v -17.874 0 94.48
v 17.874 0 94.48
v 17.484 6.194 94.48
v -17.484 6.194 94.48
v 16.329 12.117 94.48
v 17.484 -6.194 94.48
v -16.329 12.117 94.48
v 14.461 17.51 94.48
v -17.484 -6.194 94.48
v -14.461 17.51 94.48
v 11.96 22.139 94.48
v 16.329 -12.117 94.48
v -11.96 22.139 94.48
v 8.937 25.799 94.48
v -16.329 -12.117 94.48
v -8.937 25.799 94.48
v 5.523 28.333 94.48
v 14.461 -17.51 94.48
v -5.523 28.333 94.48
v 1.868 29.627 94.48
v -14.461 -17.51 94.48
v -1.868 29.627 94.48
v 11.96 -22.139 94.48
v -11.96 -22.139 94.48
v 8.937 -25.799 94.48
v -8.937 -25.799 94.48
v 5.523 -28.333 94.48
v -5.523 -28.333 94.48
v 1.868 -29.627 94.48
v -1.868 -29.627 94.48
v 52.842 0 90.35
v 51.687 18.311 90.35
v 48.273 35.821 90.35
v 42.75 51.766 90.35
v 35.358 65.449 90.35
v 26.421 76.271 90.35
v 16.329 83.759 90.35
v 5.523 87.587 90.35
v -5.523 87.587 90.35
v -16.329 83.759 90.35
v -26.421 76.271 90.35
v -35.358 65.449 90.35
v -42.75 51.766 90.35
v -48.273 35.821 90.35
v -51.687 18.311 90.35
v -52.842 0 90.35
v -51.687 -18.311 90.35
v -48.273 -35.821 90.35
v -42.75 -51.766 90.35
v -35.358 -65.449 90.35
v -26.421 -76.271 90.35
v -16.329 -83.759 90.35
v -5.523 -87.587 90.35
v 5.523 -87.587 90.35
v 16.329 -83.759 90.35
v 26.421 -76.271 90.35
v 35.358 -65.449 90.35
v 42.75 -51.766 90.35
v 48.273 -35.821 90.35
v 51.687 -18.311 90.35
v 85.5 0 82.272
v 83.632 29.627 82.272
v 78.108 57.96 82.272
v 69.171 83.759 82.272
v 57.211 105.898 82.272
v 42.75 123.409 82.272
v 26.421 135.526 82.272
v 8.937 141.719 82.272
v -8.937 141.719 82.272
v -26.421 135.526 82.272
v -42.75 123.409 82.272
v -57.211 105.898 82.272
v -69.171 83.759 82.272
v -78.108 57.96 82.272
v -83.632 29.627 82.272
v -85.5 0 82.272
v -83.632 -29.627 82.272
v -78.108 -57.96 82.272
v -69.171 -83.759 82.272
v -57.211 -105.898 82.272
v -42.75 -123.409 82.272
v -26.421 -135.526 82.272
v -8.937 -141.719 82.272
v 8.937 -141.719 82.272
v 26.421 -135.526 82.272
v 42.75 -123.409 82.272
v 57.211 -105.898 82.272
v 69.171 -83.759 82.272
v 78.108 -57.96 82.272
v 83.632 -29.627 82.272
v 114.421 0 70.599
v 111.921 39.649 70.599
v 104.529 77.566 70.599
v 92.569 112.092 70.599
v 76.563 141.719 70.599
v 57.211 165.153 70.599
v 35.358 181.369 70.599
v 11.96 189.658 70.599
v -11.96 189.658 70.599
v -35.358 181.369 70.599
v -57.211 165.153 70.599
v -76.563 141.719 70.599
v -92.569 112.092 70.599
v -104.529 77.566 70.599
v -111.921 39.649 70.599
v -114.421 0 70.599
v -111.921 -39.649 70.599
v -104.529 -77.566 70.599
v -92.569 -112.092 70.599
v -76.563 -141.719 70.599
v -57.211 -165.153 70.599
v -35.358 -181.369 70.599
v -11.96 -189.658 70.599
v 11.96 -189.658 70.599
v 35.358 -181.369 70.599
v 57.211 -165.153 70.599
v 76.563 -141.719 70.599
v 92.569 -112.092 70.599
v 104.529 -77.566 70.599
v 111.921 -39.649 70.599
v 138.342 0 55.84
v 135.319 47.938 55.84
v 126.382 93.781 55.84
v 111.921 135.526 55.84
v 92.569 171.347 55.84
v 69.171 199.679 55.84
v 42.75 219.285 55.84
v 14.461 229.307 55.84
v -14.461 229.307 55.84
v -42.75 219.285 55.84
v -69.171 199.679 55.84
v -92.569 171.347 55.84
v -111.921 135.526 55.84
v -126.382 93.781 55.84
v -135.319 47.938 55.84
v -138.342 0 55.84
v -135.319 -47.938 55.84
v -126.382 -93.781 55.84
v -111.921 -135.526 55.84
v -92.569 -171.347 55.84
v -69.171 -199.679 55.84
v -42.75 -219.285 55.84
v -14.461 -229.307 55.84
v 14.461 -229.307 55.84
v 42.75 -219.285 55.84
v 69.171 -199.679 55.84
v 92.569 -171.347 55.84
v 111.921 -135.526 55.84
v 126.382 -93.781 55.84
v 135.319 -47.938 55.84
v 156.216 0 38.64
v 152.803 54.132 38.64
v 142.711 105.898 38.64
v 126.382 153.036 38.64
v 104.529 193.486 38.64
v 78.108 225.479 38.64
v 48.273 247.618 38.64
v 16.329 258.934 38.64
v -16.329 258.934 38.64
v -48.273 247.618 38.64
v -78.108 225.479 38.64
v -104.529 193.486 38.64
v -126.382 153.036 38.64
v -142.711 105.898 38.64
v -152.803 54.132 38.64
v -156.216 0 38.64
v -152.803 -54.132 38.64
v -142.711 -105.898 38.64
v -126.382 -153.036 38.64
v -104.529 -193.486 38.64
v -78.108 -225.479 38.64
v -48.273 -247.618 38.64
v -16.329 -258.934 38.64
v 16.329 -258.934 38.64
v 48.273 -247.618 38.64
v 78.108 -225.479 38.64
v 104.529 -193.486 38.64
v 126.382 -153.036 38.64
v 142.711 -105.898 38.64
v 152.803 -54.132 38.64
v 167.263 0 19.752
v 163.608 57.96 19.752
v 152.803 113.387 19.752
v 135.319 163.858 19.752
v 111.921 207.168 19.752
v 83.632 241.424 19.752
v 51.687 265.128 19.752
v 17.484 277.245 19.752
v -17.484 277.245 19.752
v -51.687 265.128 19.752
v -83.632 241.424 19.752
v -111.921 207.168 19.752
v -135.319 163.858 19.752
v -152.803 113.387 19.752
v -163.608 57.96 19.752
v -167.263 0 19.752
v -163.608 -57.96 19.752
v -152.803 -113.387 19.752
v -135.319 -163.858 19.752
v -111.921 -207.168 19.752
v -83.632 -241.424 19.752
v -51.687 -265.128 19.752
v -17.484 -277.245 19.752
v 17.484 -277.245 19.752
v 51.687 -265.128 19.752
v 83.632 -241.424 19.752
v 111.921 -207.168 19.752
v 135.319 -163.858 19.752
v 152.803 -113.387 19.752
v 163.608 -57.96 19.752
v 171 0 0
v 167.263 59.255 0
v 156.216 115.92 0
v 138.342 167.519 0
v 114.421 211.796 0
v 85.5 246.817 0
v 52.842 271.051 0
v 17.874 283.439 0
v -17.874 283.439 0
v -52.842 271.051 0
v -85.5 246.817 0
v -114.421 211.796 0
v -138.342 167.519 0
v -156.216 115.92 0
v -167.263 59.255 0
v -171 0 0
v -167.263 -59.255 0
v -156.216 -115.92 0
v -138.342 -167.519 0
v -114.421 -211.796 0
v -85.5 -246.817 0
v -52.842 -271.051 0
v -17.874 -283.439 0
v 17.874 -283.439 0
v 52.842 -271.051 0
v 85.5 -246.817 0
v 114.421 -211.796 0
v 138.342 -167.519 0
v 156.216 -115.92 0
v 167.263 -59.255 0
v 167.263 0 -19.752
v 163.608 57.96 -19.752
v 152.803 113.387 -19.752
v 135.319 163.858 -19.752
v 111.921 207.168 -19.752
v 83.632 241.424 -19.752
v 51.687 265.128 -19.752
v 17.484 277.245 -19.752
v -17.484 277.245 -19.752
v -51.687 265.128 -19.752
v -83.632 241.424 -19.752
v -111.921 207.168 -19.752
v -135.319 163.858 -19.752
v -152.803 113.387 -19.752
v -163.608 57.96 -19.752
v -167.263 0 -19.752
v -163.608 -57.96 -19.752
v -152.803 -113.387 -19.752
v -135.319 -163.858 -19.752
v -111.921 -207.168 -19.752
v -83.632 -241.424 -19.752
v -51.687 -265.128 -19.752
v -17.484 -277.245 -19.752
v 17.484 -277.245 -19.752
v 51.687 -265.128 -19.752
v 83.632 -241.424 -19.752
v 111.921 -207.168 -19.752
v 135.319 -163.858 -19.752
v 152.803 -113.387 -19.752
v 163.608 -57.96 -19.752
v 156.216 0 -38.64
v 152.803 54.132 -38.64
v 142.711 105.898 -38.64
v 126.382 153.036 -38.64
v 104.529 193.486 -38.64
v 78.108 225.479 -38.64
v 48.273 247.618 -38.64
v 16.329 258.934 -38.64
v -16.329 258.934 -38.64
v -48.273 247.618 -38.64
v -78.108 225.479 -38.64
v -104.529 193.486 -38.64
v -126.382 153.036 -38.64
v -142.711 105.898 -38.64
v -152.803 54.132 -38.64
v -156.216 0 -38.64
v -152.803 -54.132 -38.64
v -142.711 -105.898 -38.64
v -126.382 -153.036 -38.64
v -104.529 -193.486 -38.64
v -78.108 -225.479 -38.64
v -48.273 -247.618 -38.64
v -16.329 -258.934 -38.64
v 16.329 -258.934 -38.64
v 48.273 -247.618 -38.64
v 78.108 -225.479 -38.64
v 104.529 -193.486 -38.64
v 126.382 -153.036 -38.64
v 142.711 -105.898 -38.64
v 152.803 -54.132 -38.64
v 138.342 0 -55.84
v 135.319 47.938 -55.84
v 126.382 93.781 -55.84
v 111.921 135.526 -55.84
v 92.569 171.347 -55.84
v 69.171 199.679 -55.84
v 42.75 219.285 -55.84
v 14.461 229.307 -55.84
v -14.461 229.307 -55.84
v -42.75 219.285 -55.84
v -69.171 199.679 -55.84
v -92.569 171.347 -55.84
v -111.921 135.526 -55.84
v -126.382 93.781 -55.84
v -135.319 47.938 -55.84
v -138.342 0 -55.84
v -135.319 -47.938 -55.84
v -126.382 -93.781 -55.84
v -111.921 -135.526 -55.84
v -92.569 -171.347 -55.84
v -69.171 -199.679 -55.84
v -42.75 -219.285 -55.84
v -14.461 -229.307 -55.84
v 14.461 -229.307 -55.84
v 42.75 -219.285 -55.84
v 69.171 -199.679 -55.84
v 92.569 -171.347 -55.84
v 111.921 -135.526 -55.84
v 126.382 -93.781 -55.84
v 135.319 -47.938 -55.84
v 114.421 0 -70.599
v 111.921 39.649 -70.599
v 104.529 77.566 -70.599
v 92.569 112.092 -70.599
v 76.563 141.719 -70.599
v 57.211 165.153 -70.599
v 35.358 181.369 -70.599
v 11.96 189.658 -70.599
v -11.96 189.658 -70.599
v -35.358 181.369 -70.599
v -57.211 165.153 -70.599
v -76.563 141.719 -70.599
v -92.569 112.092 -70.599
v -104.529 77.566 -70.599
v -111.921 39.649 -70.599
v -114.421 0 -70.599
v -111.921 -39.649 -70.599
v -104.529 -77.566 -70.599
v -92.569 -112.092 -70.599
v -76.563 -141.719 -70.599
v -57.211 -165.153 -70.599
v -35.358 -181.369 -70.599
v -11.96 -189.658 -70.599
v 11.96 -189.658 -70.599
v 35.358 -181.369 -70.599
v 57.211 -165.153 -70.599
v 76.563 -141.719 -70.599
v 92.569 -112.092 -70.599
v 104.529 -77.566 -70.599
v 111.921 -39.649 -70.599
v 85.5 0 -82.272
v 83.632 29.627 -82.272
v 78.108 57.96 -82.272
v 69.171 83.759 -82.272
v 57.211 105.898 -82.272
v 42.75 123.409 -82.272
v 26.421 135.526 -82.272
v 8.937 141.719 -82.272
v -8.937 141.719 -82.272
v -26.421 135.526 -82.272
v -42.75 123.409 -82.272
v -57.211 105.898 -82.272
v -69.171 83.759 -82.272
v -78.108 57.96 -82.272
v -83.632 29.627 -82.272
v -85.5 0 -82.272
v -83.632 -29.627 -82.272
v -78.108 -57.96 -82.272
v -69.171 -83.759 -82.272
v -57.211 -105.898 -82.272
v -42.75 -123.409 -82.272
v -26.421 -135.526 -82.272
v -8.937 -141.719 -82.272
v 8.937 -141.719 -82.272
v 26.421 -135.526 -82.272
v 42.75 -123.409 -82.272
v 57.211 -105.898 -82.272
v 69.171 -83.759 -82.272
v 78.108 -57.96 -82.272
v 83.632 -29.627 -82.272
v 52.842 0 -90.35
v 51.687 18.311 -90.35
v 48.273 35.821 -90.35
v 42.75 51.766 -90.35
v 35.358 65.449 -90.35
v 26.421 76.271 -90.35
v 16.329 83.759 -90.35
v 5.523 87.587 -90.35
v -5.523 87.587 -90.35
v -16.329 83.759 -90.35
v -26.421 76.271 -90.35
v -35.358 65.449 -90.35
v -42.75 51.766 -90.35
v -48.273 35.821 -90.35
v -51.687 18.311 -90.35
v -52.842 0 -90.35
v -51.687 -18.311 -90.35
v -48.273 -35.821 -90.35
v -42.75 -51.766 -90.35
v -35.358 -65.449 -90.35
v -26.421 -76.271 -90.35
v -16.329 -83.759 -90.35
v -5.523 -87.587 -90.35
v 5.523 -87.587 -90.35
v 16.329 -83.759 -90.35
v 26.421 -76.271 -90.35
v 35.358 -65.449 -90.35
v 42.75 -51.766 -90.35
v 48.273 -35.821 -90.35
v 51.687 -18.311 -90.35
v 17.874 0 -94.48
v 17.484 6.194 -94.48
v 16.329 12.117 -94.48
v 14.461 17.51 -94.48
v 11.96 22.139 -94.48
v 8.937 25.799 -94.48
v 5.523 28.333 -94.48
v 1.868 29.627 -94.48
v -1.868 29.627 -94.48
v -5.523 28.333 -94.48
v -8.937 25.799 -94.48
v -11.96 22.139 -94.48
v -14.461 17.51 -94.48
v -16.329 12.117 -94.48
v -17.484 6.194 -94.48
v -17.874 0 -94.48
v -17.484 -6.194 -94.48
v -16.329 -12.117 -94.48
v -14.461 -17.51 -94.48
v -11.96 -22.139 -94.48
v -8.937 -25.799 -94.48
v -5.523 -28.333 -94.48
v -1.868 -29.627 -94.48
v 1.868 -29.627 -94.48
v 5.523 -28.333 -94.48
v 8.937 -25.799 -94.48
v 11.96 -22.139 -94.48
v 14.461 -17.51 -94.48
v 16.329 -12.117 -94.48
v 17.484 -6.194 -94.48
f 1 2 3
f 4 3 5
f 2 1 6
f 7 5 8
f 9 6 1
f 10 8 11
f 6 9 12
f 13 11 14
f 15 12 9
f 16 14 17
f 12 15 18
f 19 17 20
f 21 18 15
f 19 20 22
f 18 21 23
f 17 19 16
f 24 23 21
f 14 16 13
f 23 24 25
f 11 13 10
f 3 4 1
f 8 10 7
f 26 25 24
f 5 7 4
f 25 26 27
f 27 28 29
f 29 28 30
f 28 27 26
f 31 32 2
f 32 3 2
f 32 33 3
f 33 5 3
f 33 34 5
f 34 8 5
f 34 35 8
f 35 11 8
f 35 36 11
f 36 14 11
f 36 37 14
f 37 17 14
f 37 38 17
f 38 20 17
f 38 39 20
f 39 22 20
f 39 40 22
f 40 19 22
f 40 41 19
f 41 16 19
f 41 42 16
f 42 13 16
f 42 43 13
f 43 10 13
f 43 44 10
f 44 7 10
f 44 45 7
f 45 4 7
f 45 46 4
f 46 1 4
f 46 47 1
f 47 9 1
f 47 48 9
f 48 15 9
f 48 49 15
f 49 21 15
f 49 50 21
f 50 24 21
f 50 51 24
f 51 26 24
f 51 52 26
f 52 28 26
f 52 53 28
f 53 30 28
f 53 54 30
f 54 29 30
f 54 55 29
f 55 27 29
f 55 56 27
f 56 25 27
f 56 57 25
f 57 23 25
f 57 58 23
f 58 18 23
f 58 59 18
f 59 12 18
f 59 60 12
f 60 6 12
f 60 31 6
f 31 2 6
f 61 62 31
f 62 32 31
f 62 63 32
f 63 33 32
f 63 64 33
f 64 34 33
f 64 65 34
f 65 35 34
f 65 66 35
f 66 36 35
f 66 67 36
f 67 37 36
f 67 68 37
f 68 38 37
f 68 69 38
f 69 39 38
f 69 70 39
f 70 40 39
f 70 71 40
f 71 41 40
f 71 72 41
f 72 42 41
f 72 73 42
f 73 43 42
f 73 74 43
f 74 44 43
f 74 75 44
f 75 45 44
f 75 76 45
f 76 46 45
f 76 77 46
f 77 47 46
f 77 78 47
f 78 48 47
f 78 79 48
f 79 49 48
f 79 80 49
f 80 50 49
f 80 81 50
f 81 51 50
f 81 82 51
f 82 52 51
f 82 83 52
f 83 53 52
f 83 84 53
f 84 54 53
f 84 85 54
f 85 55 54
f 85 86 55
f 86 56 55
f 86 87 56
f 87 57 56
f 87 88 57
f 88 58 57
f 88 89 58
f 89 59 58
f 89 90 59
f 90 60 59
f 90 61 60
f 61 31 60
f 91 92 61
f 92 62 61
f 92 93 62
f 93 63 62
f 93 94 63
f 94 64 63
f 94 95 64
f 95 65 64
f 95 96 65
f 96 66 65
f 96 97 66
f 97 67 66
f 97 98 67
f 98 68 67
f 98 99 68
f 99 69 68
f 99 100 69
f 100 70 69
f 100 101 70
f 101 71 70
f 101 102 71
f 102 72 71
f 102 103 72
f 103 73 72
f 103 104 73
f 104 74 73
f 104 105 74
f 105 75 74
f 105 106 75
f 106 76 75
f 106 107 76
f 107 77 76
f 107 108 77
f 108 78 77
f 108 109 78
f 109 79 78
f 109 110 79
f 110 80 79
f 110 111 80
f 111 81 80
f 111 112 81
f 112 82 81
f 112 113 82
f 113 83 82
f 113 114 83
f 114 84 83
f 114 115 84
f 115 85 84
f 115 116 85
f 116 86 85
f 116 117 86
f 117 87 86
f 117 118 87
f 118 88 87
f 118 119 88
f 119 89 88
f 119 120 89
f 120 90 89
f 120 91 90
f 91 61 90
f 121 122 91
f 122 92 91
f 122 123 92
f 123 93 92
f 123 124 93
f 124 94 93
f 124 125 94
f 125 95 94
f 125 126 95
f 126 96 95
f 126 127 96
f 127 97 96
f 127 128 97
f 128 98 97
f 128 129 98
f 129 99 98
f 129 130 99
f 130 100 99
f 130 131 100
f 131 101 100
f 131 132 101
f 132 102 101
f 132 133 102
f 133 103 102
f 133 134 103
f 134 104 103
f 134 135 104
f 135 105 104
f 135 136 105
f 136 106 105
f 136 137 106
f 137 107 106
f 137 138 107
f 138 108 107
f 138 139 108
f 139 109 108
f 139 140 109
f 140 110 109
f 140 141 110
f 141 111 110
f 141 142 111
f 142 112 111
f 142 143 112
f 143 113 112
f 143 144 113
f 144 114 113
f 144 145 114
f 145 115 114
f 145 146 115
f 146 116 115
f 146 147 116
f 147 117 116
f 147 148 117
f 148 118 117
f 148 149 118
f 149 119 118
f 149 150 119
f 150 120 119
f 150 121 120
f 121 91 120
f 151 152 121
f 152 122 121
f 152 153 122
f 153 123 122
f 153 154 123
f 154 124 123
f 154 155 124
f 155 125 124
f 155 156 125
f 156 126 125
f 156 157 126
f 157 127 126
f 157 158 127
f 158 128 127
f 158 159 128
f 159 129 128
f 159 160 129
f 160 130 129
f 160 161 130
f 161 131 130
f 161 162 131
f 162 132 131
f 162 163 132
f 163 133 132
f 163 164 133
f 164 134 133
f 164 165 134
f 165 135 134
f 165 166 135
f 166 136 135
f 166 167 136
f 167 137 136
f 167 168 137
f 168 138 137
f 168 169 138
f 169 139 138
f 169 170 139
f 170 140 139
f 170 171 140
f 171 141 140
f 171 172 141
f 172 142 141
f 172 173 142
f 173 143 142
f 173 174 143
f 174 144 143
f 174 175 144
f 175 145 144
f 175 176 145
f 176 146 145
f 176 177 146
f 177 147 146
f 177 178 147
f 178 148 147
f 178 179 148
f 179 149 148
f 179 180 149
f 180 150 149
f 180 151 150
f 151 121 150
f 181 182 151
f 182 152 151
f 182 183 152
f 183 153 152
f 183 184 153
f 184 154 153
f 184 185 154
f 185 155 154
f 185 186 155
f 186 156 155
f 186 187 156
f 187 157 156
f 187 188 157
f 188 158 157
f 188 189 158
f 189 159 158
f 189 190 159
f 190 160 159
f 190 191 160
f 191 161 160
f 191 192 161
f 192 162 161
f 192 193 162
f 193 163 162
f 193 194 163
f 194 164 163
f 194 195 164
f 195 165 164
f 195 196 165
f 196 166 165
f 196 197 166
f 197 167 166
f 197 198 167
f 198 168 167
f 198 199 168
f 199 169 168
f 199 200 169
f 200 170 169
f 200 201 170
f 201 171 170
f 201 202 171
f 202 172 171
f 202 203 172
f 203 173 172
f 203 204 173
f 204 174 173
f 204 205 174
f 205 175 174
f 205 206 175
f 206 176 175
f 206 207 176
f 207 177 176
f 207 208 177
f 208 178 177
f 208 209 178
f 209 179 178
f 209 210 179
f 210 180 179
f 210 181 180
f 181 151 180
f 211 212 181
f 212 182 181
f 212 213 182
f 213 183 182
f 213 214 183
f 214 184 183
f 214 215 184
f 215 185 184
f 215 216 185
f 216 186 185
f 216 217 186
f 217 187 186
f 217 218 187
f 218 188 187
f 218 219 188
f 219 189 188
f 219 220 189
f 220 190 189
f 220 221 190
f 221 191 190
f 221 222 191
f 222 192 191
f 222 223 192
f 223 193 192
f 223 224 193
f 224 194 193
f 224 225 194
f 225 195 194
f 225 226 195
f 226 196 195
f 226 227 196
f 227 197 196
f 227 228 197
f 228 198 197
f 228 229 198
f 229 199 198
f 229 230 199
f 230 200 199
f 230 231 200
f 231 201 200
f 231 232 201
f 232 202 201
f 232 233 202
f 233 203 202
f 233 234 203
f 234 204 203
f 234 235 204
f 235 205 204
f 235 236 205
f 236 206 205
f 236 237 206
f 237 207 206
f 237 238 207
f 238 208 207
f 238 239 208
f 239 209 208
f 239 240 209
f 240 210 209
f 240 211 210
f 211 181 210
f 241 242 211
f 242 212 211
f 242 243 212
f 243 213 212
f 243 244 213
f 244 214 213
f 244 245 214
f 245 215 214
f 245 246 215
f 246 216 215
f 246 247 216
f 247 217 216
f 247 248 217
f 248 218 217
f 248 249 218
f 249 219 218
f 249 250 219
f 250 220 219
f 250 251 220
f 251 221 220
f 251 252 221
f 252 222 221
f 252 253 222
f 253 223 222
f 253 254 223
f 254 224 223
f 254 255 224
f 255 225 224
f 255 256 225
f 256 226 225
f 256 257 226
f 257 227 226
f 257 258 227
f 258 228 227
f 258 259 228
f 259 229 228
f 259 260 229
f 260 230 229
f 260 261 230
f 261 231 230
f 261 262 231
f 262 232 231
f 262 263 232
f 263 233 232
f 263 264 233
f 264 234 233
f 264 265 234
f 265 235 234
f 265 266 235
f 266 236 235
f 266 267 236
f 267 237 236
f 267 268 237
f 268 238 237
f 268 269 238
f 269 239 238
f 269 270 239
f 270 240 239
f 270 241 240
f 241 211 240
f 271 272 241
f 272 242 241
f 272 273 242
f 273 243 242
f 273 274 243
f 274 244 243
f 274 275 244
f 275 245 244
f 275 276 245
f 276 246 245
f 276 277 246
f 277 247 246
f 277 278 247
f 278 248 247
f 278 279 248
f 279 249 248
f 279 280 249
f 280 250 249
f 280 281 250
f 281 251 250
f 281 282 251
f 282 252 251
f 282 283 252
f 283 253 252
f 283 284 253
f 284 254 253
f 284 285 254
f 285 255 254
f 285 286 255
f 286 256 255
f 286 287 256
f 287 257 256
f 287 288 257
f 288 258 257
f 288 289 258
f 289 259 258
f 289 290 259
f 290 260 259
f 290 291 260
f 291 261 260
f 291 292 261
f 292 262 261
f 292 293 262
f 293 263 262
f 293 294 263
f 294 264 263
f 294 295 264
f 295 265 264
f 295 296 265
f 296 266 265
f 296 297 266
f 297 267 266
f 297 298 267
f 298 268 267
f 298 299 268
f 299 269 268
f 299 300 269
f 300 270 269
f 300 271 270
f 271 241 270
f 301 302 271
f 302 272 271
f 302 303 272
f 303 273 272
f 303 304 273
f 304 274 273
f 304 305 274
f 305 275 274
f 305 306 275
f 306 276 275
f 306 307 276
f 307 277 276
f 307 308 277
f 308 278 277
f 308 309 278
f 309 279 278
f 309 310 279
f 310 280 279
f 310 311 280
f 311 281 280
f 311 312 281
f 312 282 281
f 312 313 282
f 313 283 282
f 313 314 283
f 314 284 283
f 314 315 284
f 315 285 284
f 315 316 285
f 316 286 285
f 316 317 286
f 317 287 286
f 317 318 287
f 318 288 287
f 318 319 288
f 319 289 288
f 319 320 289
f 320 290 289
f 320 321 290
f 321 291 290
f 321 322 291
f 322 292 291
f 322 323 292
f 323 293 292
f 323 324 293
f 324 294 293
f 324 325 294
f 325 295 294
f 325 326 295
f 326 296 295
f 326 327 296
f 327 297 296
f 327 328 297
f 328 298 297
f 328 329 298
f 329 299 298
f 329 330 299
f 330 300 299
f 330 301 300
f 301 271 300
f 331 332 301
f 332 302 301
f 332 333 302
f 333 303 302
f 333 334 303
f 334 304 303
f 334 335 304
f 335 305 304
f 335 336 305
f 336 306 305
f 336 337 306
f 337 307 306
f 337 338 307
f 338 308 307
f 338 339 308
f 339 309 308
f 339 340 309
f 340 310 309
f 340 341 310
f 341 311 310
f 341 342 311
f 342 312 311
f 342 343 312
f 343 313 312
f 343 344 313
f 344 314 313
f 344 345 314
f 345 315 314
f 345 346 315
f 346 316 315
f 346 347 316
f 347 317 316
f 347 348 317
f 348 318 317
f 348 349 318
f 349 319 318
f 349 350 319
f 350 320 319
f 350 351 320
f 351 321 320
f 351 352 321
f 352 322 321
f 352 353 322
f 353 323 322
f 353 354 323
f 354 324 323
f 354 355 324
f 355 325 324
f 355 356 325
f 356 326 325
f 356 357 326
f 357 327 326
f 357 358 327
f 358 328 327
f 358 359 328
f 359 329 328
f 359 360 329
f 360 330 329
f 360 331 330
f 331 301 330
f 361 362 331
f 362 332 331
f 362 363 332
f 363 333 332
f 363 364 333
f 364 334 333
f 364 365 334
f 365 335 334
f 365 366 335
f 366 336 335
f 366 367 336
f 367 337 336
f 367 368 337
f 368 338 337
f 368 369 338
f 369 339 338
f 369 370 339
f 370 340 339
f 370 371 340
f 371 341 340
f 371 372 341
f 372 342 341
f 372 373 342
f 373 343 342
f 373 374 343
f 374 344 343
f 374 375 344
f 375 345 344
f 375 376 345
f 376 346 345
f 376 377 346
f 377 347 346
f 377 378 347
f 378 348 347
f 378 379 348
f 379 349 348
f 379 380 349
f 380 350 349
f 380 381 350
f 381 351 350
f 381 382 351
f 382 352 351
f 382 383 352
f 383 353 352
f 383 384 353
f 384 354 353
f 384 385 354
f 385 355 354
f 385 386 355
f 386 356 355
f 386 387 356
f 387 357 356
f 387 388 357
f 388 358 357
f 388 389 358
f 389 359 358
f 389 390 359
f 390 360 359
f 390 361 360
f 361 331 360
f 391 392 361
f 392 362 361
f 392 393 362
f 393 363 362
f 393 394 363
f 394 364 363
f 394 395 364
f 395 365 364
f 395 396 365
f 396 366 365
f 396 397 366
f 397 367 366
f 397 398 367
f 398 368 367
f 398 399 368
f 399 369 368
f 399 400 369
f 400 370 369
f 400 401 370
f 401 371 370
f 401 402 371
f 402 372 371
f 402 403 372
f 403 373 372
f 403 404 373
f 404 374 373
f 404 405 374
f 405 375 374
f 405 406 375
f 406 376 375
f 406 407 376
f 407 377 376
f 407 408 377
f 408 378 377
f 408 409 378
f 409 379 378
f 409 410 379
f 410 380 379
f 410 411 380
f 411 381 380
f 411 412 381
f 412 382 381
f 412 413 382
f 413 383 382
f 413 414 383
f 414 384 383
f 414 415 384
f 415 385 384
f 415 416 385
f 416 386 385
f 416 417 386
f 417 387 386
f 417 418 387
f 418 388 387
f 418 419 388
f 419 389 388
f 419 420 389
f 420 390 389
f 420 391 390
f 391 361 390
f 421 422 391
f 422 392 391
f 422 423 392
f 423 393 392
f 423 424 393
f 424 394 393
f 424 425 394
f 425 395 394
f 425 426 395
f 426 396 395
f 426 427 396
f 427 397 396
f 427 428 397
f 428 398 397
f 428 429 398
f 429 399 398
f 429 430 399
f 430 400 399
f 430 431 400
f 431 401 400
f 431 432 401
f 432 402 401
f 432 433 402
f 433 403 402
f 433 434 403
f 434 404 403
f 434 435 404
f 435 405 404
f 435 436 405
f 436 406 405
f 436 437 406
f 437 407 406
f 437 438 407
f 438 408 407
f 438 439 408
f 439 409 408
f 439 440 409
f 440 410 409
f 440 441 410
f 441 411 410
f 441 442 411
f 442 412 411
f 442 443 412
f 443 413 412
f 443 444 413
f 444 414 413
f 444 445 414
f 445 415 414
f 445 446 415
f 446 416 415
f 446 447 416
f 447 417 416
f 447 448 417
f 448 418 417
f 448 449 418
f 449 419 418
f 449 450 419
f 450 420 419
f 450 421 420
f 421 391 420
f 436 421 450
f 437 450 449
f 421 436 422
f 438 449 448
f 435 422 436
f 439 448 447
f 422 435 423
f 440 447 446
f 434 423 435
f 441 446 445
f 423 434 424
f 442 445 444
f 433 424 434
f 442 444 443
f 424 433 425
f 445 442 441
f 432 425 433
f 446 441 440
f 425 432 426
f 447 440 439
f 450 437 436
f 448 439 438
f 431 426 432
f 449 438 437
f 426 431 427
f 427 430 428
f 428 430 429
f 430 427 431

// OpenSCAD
// Generated by SolidPython 1.0.1 on 2020-07-29 00:46:49


scale(v = [9, 15, 5]) {
	sphere(r = 19);
}
/***********************************************
*********      SolidPython code:      **********
************************************************
 
# import packages: SolidPython
from solid import *
from solid.utils import *
from itertools import chain, combinations, permutations


class Resize:

    def __init__(self, scad_file):
        self.scad_file = scad_file
        #self.scad_file = import_scad(scad_file)
        # cone/cylinder param:
        self.r1 = 0
        self.r2 = 0
        self.h = 0
        # rectangular prism param:
        self.w = 0
        self.l = 0
        # ellipse param:
        self.r = 0

    # import OpenScad code (file name corresponds to shape)


    # classify shape + parameters
    def assign(self, param1, param2, param3):
        if self.scad_file == 'cone.scad':
            self.r1 = param1
            self.r2 = param2
            self.h = param3
        elif self.scad_file == 'cylinder.scad':
            self.r1 = param1
            self.r2 = param2
            self.h = param3
        elif self.scad_file == 'rectangularPrism.scad':
            self.h = param1
            self.l = param2
            self.w = param3
        else:
            self.r = param1
            self.h = param2

    # resize parameters
    def iterate(self):
        x = range(3, 20, 2)
        i = 1
        if self.scad_file == 'cone.scad':
            tempList = list(permutations(x, 2))
            for temp in tempList:
                param1 = temp[0]
                param2 = temp[1]
                filepath = 'produced_scad_files/' + 'cone' + str(param1) + '_' + str(param2) + '_' + '.scad'
                scad_render_to_file(cylinder(h=param1, r1=param2, r2=0), filepath)

        elif self.scad_file == 'cylinder.scad':
            tempList = list(permutations(x, 3))
            for temp in tempList:
                param1 = temp[0]
                param2 = temp[1]
                filepath = 'produced_scad_files/' + 'cylinder' + str(param1) + '_' + str(param2) + '_' + '.scad'
                scad_render_to_file(cylinder(h=param1, r1=param2, r2=param2), filepath)

        elif self.scad_file == 'rectangularPrism.scad':
            tempList = list(permutations(x, 3))
            for temp in tempList:
                param1 = temp[0]
                param2 = temp[1]
                param3 = temp[2]
                filepath = 'produced_scad_files/' + 'rectangularPrism' + str(param1) + '_' + str(param2) + '_' + str(
                    param3) + '.scad'
                scad_render_to_file(cube(size=(param1, param2, param3)), filepath)

        elif self.scad_file == 'ellipse.scad':
            tempList = list(permutations(x, 4))
            for temp in tempList:
                param1 = temp[0]
                param2 = temp[1]
                param3 = temp[2]
                param4 = temp[3]
                filepath = 'produced_scad_files/' + 'ellipse' + str(param1) + '_' + str(param2) + '_' + str(param3) + '_' + str(param4) + '.scad'
                scad_render_to_file(scale([param1, param2, param3])(sphere(r=param4)), filepath)

    def render_to_scadfile(self):
        scad_render_to_file(scad, 'example.scad') 
 
************************************************/
